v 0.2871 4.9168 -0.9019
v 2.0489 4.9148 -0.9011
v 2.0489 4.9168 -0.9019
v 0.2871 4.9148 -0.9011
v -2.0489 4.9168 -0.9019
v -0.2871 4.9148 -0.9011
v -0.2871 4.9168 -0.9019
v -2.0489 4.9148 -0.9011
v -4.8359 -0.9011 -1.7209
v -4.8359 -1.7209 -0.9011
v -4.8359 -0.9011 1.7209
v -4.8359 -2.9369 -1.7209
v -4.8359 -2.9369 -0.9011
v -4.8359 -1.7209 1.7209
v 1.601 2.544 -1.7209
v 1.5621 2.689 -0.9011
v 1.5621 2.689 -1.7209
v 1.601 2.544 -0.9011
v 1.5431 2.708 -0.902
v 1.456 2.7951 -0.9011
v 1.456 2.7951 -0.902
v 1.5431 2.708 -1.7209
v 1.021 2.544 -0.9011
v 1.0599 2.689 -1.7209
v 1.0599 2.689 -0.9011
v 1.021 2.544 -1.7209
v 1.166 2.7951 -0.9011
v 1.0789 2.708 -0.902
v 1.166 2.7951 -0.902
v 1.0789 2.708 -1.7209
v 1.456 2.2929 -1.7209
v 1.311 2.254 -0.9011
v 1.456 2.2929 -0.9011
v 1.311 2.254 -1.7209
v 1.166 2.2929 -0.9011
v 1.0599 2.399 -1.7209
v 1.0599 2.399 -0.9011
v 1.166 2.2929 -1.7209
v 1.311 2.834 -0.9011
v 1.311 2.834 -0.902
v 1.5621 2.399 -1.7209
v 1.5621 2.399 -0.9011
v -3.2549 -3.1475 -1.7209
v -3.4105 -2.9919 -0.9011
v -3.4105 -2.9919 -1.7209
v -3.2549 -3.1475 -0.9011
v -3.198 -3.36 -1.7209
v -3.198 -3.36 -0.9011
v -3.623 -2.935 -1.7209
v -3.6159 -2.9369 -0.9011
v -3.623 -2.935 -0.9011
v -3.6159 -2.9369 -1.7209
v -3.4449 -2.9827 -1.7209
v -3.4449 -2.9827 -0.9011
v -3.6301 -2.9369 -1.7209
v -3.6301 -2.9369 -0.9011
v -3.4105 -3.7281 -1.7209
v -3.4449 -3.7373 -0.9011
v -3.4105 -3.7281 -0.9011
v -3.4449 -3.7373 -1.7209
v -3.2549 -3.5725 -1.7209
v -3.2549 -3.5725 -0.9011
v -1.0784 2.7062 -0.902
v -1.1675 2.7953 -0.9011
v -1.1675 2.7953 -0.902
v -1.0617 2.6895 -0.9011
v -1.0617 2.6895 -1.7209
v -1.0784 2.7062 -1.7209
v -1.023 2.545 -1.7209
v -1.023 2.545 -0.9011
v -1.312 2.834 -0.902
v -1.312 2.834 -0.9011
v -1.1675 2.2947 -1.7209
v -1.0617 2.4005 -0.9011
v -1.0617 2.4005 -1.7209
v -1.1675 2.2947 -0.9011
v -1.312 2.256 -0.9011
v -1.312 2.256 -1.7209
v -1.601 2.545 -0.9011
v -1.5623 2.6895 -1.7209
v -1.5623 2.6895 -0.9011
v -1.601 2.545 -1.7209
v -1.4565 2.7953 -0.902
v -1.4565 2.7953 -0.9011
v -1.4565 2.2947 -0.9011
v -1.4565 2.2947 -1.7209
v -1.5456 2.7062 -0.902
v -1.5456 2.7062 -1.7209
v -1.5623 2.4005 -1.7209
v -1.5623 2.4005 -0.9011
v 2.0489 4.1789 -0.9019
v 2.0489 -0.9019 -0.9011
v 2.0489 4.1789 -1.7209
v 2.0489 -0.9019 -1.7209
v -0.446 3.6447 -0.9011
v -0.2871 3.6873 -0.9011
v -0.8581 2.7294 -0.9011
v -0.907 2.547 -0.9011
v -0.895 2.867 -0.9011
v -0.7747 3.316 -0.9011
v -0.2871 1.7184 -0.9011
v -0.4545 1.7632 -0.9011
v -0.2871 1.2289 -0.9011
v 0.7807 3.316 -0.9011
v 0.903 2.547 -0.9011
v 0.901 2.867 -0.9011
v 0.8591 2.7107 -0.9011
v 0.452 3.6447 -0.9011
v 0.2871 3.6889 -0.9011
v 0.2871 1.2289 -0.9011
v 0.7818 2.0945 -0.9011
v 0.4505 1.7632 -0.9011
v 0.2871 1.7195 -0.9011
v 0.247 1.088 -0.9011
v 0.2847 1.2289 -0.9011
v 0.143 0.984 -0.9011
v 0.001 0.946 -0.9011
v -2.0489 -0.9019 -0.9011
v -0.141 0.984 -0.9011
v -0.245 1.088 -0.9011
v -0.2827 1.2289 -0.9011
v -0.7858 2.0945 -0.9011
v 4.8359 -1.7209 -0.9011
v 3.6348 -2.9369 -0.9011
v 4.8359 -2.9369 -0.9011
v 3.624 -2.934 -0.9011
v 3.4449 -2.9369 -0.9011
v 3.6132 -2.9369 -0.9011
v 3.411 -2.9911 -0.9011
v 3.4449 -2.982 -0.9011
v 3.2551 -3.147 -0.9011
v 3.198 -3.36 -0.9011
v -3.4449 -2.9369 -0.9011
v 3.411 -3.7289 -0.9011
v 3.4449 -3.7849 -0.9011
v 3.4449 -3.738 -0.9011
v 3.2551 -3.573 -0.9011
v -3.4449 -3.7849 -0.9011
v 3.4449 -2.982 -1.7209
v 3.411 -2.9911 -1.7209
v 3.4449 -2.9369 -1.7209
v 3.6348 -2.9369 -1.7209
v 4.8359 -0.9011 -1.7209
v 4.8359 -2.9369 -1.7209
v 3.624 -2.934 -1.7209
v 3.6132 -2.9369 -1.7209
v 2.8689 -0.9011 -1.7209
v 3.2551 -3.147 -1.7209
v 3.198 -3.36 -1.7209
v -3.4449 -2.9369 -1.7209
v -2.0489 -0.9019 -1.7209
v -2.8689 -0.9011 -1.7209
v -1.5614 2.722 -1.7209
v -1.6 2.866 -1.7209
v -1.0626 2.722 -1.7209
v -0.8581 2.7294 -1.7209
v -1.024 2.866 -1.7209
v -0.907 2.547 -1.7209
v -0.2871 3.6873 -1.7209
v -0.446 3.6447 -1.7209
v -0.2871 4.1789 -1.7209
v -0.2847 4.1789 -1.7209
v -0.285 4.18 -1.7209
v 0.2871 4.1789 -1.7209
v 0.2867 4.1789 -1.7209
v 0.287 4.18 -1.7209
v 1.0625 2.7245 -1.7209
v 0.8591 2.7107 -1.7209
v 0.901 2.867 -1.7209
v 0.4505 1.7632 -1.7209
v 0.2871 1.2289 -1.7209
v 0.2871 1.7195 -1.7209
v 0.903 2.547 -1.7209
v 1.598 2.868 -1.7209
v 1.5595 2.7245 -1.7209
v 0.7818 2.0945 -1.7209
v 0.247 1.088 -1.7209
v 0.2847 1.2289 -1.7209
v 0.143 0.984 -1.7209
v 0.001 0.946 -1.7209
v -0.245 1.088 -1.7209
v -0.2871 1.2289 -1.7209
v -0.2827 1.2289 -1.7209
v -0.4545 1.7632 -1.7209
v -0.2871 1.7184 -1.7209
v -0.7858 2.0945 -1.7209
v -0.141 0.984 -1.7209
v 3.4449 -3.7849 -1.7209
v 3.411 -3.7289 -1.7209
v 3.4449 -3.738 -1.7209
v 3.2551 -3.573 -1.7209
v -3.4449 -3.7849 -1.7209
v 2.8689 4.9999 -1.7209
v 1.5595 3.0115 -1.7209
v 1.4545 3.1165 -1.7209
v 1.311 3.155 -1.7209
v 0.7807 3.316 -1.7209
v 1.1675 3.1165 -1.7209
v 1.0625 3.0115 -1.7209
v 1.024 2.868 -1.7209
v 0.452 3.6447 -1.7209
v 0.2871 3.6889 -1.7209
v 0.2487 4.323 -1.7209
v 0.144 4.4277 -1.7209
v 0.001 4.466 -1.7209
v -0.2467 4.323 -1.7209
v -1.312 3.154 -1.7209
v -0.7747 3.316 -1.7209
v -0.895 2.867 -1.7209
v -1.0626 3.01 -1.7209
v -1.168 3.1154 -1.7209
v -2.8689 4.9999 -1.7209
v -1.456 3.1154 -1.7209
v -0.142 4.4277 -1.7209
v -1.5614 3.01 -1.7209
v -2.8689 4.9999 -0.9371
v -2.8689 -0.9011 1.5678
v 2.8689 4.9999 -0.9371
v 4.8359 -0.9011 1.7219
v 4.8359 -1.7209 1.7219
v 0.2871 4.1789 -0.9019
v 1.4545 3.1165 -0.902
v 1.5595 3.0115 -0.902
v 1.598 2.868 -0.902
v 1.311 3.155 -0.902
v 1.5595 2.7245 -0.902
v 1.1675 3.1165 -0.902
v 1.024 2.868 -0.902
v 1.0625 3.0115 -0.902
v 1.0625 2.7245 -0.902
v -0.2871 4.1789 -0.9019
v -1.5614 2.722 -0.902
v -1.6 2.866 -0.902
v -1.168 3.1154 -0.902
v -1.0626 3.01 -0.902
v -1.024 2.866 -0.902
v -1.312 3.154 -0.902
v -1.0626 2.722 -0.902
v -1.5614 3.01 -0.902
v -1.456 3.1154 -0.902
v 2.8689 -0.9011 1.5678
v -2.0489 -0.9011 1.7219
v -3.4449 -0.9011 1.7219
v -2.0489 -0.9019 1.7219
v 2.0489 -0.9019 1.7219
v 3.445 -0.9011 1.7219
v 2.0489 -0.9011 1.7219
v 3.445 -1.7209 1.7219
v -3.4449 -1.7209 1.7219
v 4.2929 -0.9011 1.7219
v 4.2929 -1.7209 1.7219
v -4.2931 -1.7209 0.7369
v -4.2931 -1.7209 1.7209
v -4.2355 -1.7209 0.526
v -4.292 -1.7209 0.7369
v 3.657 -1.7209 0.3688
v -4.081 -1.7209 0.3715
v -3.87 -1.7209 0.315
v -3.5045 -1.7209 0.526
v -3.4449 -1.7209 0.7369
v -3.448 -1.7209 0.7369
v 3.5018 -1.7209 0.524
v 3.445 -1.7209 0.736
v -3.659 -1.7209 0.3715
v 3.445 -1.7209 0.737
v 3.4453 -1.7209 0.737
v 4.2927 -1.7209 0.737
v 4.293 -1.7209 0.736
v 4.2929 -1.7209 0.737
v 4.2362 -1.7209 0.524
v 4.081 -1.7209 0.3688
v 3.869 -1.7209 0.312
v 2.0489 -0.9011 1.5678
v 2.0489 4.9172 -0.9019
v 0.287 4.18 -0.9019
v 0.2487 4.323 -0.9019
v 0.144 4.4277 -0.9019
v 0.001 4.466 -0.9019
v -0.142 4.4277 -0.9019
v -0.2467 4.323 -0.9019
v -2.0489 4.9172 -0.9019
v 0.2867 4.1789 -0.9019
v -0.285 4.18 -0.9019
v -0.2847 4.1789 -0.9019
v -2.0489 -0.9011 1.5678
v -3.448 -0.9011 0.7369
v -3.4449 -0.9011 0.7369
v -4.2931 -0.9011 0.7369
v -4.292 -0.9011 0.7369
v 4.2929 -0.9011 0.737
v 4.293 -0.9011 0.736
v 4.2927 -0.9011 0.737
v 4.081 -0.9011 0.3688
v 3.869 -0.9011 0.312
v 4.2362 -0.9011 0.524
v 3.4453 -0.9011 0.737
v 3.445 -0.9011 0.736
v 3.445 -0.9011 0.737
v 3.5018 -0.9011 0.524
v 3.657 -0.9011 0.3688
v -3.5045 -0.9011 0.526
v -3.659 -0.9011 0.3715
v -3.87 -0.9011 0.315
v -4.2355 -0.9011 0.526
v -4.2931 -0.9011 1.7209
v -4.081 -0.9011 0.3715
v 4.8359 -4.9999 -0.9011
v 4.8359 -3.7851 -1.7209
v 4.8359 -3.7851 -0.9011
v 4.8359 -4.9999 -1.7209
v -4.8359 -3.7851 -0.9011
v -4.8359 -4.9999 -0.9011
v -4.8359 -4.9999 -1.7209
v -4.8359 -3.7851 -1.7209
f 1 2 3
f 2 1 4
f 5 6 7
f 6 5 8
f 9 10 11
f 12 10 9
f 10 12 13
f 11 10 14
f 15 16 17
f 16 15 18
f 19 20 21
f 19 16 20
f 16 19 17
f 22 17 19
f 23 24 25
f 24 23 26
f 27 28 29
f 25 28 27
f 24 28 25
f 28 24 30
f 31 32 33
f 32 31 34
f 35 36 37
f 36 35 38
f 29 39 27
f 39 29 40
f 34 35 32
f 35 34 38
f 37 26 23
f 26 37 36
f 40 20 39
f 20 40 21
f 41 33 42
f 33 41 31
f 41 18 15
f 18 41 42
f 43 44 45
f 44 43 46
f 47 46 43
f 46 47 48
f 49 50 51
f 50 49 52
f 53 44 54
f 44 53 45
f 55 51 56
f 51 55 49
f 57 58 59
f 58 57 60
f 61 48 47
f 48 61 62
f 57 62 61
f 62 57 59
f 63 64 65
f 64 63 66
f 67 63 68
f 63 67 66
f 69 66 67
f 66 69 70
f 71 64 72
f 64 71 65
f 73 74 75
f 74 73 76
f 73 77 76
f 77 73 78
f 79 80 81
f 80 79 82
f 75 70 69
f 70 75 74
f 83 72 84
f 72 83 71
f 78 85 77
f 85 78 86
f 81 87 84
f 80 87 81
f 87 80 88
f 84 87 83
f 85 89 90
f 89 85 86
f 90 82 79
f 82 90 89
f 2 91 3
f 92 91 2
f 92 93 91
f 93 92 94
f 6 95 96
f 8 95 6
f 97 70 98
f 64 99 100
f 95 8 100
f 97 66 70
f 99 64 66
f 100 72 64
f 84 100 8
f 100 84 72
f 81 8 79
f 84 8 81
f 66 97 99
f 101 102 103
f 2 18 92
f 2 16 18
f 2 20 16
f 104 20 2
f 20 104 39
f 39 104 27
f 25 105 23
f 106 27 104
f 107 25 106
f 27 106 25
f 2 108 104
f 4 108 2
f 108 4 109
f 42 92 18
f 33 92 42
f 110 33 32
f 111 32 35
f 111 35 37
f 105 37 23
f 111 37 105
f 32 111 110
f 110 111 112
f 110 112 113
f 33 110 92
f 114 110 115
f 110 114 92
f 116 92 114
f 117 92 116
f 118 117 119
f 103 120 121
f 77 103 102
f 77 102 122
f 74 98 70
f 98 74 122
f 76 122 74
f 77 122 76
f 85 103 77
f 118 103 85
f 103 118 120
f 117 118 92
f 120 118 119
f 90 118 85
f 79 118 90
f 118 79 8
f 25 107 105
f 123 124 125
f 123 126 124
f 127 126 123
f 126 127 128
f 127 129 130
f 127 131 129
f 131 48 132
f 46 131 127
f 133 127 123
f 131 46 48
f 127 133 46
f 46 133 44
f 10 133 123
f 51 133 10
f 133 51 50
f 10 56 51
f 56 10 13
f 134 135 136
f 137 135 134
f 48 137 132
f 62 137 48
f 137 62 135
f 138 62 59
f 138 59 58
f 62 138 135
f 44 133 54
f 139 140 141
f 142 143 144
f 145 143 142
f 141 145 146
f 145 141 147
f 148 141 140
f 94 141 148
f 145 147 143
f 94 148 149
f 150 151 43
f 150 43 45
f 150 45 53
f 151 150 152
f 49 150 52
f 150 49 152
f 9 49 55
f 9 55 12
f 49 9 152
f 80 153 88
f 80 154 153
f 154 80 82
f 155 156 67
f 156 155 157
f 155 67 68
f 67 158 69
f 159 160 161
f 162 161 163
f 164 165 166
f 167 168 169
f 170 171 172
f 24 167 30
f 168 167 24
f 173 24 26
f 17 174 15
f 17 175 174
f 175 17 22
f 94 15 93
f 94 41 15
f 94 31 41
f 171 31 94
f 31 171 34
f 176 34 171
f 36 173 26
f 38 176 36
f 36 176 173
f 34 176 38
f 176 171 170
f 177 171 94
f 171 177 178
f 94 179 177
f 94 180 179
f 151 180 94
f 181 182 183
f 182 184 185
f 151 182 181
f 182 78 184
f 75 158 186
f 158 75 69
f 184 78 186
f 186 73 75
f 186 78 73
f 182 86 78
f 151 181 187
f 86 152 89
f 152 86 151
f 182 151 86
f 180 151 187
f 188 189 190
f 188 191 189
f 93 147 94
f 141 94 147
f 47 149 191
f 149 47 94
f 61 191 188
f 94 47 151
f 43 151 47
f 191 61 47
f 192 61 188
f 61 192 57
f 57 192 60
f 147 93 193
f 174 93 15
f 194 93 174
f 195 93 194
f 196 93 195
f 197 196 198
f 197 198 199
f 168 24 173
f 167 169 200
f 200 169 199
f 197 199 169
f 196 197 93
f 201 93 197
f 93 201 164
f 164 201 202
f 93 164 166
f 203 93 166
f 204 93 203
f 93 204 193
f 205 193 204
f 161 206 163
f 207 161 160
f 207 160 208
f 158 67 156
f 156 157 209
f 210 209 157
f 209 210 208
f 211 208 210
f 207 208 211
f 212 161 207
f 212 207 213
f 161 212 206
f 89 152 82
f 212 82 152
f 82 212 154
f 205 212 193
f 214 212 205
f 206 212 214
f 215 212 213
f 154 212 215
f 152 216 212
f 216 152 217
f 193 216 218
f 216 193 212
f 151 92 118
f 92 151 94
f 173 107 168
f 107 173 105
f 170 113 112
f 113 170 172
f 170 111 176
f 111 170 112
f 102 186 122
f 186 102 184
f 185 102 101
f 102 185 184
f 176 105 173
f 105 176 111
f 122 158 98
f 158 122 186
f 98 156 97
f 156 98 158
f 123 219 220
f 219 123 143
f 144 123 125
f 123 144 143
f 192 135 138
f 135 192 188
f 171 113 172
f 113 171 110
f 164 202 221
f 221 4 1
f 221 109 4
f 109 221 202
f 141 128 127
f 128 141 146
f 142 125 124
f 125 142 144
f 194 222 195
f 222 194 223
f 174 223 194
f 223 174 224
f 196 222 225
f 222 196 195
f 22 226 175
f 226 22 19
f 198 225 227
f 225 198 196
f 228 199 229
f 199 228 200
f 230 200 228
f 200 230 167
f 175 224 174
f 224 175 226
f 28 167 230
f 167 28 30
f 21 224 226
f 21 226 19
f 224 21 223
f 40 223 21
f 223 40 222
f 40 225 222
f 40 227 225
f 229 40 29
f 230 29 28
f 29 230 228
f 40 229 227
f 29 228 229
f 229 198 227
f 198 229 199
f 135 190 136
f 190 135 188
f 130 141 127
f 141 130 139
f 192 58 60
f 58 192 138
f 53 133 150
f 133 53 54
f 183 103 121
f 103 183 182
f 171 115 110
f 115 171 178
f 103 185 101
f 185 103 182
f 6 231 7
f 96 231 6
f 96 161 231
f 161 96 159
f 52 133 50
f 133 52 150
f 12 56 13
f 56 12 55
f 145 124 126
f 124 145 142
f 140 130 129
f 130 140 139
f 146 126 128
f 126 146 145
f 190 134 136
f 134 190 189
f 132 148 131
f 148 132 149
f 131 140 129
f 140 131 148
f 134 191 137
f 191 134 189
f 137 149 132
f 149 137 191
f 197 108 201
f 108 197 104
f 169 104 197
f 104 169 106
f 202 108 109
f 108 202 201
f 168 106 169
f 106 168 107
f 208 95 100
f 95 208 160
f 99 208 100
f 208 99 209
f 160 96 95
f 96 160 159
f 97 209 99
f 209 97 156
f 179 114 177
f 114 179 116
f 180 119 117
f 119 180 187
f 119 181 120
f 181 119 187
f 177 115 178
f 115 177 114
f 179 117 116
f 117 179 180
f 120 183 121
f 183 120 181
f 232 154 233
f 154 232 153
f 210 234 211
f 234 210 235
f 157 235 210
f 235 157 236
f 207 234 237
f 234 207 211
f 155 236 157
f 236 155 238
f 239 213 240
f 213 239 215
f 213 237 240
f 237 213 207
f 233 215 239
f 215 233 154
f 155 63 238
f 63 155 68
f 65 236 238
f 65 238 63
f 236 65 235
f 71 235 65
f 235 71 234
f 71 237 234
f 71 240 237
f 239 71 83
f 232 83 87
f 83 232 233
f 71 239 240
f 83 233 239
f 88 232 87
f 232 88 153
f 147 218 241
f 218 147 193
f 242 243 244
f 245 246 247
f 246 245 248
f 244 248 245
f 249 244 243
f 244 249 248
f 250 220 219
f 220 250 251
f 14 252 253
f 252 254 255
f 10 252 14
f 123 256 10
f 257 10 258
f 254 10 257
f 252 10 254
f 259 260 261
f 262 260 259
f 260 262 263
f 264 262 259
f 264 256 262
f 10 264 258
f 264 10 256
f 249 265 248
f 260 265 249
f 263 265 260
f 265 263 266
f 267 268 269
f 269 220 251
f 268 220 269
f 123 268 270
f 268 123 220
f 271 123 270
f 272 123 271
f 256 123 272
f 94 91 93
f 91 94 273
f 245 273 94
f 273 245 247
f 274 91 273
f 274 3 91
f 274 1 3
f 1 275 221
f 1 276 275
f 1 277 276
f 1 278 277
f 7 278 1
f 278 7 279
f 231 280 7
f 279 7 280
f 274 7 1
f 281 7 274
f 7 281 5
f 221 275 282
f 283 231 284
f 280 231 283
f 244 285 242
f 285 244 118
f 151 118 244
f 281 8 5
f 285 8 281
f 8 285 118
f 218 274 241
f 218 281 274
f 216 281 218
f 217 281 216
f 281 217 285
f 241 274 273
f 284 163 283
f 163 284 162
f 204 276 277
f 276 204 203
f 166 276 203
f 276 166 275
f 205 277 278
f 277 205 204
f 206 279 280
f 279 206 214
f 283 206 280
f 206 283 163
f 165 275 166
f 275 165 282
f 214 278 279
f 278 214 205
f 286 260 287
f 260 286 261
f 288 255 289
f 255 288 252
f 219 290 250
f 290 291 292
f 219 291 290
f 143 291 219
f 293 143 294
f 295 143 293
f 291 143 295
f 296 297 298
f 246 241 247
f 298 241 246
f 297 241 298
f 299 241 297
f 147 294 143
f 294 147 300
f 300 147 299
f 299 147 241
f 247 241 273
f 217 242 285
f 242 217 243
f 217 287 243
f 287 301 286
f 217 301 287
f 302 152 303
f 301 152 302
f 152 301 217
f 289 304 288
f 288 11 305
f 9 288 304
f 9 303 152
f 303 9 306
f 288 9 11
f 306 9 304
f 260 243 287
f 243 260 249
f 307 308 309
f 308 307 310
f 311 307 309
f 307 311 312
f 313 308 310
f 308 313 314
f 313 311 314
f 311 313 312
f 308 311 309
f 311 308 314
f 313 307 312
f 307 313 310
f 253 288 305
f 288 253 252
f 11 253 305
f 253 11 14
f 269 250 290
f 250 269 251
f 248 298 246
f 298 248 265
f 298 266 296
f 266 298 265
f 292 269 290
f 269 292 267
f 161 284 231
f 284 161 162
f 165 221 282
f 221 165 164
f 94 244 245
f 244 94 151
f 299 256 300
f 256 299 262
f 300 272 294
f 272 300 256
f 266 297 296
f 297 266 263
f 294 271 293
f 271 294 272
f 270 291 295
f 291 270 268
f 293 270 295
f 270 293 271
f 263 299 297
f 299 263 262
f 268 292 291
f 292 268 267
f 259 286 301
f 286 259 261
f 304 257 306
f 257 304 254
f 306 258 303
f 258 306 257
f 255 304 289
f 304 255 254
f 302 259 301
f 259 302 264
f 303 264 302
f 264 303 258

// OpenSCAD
intersection() {
  translate([0.0005, 0, -0.0005])
  cube(size = [11.6068, 11.9998, 4.1308], center = true);

  union() {
    intersection() {
      difference() {
        difference() {
          translate([6.632, -3.32297, -7.82843])
          rotate([-23, 0, 0])
          cube(size = [22.9358, 36.1998, 19.1908], center = true);
        
          translate([1.311, 2.544, -0.492])
          cylinder(h = 2.4579, r1 = 0.29, r2 = 0.29, center = true, $fn = 12);
        }
      
        union() {
          translate([-3.623, -3.36, -0.492])
          cylinder(h = 2.4579, r1 = 0.425, r2 = 0.425, center = true, $fn = 12);
        
          translate([-1.312, 2.545, 8.1895])
          cylinder(h = 19.8209, r1 = 0.289, r2 = 0.289, center = true, $fn = 12);
        }
      }
    
      union() {
        difference() {
          translate([-0.41, 2.049, -1.311])
          cube(size = [4.9178, 5.9018, 0.8198], center = true);
        
          translate([-0.002, 2.547, 0])
          cylinder(h = 36.1999, r1 = 0.905, r2 = 0.905, center = true, $fn = 12);
        }
      
        translate([0, -2.3435, -1.311])
        cube(size = [9.6718, 2.8828, 0.8198], center = true);
      }
    
      difference() {
        union() {
          translate([0, -1.278, -1.311])
          cube(size = [6.8898, 5.0138, 0.8198], center = true);
        
          translate([-9.1935, 1.0315, 0.0005])
          cube(size = [17.8128, 7.9368, 3.4428], center = true);
        
          difference() {
            translate([9.1935, 1.0315, -1.311])
            cube(size = [17.8128, 7.9368, 0.8198], center = true);
          
            translate([1.311, 2.868, -9.501])
            cylinder(h = 17.1979, r1 = 0.287, r2 = 0.287, center = true, $fn = 12);
          }
        }
      
        union() {
          translate([3.624, -3.36, -1.311])
          cylinder(h = 0.8199, r1 = 0.426, r2 = 0.426, center = true, $fn = 12);
        
          translate([0.003, 2.867, -8.6815])
          cylinder(h = 18.8369, r1 = 0.898, r2 = 0.898, center = true, $fn = 12);
        
          translate([0.001, 1.23, -8.1895])
          cylinder(h = 19.8209, r1 = 0.284, r2 = 0.284, center = true, $fn = 12);
        
          translate([-1.312, 2.866, -9.501])
          cylinder(h = 17.1979, r1 = 0.288, r2 = 0.288, center = true, $fn = 12);
        }
      }
    }
  
    difference() {
      union() {
        difference() {
          difference() {
            translate([0, 1.6395, 0.0005])
            cube(size = [5.7378, 6.7208, 3.4428], center = true);
          
            translate([0, 3.115, 8.599])
            cube(size = [4.0979, 3.7699, 19.0019], center = true);
          }
        
          union() {
            translate([0, 3.74926, 8.8327])
            rotate([-23, 0, 0])
            cube(size = [5.7379, 36.1999, 17.0089], center = true);
          
            translate([0.001, 4.18, -8.6815])
            cylinder(h = 18.8369, r1 = 0.286, r2 = 0.286, center = true, $fn = 12);
          }
        }
      
        translate([0, -1.311, -0.492])
        cube(size = [9.6718, 0.8198, 2.4578], center = true);
      
        translate([0.6955, -1.311, 0.0005])
        cube(size = [8.2808, 0.8198, 3.4428], center = true);
      
        translate([0, -4.3925, -1.311])
        cube(size = [9.6718, 1.2148, 0.8198], center = true);
      
        translate([-4.5645, -1.311, 0.4095])
        cube(size = [0.5428, 0.8198, 2.6228], center = true);
      }
    
      union() {
        translate([3.869, -1.311, 9.4185])
        cube(size = [0.8479, 0.8199, 17.3629], center = true);
      
        intersection() {
          sphere(r = 54.2999, $fn = 108);
        
          translate([3.869, 3.74926, 8.8327])
          rotate([-23, 0, 0])
          cube(size = [0.8479, 36.1999, 17.0089], center = true);
        }
      
        translate([0, 1.6385, 8.1895])
        cube(size = [4.0979, 5.0809, 19.8209], center = true);
      
        translate([3.869, -8.435, 0.736])
        rotate([180, 90, -90])
        cylinder(h = 19.3299, r1 = 0.424, r2 = 0.424, center = true, $fn = 12);
      
        translate([-3.87, -1.311, 0.737])
        rotate([180, 90, -90])
        cylinder(h = 0.8199, r1 = 0.422, r2 = 0.422, center = true, $fn = 12);
      }
    }
  }
}
